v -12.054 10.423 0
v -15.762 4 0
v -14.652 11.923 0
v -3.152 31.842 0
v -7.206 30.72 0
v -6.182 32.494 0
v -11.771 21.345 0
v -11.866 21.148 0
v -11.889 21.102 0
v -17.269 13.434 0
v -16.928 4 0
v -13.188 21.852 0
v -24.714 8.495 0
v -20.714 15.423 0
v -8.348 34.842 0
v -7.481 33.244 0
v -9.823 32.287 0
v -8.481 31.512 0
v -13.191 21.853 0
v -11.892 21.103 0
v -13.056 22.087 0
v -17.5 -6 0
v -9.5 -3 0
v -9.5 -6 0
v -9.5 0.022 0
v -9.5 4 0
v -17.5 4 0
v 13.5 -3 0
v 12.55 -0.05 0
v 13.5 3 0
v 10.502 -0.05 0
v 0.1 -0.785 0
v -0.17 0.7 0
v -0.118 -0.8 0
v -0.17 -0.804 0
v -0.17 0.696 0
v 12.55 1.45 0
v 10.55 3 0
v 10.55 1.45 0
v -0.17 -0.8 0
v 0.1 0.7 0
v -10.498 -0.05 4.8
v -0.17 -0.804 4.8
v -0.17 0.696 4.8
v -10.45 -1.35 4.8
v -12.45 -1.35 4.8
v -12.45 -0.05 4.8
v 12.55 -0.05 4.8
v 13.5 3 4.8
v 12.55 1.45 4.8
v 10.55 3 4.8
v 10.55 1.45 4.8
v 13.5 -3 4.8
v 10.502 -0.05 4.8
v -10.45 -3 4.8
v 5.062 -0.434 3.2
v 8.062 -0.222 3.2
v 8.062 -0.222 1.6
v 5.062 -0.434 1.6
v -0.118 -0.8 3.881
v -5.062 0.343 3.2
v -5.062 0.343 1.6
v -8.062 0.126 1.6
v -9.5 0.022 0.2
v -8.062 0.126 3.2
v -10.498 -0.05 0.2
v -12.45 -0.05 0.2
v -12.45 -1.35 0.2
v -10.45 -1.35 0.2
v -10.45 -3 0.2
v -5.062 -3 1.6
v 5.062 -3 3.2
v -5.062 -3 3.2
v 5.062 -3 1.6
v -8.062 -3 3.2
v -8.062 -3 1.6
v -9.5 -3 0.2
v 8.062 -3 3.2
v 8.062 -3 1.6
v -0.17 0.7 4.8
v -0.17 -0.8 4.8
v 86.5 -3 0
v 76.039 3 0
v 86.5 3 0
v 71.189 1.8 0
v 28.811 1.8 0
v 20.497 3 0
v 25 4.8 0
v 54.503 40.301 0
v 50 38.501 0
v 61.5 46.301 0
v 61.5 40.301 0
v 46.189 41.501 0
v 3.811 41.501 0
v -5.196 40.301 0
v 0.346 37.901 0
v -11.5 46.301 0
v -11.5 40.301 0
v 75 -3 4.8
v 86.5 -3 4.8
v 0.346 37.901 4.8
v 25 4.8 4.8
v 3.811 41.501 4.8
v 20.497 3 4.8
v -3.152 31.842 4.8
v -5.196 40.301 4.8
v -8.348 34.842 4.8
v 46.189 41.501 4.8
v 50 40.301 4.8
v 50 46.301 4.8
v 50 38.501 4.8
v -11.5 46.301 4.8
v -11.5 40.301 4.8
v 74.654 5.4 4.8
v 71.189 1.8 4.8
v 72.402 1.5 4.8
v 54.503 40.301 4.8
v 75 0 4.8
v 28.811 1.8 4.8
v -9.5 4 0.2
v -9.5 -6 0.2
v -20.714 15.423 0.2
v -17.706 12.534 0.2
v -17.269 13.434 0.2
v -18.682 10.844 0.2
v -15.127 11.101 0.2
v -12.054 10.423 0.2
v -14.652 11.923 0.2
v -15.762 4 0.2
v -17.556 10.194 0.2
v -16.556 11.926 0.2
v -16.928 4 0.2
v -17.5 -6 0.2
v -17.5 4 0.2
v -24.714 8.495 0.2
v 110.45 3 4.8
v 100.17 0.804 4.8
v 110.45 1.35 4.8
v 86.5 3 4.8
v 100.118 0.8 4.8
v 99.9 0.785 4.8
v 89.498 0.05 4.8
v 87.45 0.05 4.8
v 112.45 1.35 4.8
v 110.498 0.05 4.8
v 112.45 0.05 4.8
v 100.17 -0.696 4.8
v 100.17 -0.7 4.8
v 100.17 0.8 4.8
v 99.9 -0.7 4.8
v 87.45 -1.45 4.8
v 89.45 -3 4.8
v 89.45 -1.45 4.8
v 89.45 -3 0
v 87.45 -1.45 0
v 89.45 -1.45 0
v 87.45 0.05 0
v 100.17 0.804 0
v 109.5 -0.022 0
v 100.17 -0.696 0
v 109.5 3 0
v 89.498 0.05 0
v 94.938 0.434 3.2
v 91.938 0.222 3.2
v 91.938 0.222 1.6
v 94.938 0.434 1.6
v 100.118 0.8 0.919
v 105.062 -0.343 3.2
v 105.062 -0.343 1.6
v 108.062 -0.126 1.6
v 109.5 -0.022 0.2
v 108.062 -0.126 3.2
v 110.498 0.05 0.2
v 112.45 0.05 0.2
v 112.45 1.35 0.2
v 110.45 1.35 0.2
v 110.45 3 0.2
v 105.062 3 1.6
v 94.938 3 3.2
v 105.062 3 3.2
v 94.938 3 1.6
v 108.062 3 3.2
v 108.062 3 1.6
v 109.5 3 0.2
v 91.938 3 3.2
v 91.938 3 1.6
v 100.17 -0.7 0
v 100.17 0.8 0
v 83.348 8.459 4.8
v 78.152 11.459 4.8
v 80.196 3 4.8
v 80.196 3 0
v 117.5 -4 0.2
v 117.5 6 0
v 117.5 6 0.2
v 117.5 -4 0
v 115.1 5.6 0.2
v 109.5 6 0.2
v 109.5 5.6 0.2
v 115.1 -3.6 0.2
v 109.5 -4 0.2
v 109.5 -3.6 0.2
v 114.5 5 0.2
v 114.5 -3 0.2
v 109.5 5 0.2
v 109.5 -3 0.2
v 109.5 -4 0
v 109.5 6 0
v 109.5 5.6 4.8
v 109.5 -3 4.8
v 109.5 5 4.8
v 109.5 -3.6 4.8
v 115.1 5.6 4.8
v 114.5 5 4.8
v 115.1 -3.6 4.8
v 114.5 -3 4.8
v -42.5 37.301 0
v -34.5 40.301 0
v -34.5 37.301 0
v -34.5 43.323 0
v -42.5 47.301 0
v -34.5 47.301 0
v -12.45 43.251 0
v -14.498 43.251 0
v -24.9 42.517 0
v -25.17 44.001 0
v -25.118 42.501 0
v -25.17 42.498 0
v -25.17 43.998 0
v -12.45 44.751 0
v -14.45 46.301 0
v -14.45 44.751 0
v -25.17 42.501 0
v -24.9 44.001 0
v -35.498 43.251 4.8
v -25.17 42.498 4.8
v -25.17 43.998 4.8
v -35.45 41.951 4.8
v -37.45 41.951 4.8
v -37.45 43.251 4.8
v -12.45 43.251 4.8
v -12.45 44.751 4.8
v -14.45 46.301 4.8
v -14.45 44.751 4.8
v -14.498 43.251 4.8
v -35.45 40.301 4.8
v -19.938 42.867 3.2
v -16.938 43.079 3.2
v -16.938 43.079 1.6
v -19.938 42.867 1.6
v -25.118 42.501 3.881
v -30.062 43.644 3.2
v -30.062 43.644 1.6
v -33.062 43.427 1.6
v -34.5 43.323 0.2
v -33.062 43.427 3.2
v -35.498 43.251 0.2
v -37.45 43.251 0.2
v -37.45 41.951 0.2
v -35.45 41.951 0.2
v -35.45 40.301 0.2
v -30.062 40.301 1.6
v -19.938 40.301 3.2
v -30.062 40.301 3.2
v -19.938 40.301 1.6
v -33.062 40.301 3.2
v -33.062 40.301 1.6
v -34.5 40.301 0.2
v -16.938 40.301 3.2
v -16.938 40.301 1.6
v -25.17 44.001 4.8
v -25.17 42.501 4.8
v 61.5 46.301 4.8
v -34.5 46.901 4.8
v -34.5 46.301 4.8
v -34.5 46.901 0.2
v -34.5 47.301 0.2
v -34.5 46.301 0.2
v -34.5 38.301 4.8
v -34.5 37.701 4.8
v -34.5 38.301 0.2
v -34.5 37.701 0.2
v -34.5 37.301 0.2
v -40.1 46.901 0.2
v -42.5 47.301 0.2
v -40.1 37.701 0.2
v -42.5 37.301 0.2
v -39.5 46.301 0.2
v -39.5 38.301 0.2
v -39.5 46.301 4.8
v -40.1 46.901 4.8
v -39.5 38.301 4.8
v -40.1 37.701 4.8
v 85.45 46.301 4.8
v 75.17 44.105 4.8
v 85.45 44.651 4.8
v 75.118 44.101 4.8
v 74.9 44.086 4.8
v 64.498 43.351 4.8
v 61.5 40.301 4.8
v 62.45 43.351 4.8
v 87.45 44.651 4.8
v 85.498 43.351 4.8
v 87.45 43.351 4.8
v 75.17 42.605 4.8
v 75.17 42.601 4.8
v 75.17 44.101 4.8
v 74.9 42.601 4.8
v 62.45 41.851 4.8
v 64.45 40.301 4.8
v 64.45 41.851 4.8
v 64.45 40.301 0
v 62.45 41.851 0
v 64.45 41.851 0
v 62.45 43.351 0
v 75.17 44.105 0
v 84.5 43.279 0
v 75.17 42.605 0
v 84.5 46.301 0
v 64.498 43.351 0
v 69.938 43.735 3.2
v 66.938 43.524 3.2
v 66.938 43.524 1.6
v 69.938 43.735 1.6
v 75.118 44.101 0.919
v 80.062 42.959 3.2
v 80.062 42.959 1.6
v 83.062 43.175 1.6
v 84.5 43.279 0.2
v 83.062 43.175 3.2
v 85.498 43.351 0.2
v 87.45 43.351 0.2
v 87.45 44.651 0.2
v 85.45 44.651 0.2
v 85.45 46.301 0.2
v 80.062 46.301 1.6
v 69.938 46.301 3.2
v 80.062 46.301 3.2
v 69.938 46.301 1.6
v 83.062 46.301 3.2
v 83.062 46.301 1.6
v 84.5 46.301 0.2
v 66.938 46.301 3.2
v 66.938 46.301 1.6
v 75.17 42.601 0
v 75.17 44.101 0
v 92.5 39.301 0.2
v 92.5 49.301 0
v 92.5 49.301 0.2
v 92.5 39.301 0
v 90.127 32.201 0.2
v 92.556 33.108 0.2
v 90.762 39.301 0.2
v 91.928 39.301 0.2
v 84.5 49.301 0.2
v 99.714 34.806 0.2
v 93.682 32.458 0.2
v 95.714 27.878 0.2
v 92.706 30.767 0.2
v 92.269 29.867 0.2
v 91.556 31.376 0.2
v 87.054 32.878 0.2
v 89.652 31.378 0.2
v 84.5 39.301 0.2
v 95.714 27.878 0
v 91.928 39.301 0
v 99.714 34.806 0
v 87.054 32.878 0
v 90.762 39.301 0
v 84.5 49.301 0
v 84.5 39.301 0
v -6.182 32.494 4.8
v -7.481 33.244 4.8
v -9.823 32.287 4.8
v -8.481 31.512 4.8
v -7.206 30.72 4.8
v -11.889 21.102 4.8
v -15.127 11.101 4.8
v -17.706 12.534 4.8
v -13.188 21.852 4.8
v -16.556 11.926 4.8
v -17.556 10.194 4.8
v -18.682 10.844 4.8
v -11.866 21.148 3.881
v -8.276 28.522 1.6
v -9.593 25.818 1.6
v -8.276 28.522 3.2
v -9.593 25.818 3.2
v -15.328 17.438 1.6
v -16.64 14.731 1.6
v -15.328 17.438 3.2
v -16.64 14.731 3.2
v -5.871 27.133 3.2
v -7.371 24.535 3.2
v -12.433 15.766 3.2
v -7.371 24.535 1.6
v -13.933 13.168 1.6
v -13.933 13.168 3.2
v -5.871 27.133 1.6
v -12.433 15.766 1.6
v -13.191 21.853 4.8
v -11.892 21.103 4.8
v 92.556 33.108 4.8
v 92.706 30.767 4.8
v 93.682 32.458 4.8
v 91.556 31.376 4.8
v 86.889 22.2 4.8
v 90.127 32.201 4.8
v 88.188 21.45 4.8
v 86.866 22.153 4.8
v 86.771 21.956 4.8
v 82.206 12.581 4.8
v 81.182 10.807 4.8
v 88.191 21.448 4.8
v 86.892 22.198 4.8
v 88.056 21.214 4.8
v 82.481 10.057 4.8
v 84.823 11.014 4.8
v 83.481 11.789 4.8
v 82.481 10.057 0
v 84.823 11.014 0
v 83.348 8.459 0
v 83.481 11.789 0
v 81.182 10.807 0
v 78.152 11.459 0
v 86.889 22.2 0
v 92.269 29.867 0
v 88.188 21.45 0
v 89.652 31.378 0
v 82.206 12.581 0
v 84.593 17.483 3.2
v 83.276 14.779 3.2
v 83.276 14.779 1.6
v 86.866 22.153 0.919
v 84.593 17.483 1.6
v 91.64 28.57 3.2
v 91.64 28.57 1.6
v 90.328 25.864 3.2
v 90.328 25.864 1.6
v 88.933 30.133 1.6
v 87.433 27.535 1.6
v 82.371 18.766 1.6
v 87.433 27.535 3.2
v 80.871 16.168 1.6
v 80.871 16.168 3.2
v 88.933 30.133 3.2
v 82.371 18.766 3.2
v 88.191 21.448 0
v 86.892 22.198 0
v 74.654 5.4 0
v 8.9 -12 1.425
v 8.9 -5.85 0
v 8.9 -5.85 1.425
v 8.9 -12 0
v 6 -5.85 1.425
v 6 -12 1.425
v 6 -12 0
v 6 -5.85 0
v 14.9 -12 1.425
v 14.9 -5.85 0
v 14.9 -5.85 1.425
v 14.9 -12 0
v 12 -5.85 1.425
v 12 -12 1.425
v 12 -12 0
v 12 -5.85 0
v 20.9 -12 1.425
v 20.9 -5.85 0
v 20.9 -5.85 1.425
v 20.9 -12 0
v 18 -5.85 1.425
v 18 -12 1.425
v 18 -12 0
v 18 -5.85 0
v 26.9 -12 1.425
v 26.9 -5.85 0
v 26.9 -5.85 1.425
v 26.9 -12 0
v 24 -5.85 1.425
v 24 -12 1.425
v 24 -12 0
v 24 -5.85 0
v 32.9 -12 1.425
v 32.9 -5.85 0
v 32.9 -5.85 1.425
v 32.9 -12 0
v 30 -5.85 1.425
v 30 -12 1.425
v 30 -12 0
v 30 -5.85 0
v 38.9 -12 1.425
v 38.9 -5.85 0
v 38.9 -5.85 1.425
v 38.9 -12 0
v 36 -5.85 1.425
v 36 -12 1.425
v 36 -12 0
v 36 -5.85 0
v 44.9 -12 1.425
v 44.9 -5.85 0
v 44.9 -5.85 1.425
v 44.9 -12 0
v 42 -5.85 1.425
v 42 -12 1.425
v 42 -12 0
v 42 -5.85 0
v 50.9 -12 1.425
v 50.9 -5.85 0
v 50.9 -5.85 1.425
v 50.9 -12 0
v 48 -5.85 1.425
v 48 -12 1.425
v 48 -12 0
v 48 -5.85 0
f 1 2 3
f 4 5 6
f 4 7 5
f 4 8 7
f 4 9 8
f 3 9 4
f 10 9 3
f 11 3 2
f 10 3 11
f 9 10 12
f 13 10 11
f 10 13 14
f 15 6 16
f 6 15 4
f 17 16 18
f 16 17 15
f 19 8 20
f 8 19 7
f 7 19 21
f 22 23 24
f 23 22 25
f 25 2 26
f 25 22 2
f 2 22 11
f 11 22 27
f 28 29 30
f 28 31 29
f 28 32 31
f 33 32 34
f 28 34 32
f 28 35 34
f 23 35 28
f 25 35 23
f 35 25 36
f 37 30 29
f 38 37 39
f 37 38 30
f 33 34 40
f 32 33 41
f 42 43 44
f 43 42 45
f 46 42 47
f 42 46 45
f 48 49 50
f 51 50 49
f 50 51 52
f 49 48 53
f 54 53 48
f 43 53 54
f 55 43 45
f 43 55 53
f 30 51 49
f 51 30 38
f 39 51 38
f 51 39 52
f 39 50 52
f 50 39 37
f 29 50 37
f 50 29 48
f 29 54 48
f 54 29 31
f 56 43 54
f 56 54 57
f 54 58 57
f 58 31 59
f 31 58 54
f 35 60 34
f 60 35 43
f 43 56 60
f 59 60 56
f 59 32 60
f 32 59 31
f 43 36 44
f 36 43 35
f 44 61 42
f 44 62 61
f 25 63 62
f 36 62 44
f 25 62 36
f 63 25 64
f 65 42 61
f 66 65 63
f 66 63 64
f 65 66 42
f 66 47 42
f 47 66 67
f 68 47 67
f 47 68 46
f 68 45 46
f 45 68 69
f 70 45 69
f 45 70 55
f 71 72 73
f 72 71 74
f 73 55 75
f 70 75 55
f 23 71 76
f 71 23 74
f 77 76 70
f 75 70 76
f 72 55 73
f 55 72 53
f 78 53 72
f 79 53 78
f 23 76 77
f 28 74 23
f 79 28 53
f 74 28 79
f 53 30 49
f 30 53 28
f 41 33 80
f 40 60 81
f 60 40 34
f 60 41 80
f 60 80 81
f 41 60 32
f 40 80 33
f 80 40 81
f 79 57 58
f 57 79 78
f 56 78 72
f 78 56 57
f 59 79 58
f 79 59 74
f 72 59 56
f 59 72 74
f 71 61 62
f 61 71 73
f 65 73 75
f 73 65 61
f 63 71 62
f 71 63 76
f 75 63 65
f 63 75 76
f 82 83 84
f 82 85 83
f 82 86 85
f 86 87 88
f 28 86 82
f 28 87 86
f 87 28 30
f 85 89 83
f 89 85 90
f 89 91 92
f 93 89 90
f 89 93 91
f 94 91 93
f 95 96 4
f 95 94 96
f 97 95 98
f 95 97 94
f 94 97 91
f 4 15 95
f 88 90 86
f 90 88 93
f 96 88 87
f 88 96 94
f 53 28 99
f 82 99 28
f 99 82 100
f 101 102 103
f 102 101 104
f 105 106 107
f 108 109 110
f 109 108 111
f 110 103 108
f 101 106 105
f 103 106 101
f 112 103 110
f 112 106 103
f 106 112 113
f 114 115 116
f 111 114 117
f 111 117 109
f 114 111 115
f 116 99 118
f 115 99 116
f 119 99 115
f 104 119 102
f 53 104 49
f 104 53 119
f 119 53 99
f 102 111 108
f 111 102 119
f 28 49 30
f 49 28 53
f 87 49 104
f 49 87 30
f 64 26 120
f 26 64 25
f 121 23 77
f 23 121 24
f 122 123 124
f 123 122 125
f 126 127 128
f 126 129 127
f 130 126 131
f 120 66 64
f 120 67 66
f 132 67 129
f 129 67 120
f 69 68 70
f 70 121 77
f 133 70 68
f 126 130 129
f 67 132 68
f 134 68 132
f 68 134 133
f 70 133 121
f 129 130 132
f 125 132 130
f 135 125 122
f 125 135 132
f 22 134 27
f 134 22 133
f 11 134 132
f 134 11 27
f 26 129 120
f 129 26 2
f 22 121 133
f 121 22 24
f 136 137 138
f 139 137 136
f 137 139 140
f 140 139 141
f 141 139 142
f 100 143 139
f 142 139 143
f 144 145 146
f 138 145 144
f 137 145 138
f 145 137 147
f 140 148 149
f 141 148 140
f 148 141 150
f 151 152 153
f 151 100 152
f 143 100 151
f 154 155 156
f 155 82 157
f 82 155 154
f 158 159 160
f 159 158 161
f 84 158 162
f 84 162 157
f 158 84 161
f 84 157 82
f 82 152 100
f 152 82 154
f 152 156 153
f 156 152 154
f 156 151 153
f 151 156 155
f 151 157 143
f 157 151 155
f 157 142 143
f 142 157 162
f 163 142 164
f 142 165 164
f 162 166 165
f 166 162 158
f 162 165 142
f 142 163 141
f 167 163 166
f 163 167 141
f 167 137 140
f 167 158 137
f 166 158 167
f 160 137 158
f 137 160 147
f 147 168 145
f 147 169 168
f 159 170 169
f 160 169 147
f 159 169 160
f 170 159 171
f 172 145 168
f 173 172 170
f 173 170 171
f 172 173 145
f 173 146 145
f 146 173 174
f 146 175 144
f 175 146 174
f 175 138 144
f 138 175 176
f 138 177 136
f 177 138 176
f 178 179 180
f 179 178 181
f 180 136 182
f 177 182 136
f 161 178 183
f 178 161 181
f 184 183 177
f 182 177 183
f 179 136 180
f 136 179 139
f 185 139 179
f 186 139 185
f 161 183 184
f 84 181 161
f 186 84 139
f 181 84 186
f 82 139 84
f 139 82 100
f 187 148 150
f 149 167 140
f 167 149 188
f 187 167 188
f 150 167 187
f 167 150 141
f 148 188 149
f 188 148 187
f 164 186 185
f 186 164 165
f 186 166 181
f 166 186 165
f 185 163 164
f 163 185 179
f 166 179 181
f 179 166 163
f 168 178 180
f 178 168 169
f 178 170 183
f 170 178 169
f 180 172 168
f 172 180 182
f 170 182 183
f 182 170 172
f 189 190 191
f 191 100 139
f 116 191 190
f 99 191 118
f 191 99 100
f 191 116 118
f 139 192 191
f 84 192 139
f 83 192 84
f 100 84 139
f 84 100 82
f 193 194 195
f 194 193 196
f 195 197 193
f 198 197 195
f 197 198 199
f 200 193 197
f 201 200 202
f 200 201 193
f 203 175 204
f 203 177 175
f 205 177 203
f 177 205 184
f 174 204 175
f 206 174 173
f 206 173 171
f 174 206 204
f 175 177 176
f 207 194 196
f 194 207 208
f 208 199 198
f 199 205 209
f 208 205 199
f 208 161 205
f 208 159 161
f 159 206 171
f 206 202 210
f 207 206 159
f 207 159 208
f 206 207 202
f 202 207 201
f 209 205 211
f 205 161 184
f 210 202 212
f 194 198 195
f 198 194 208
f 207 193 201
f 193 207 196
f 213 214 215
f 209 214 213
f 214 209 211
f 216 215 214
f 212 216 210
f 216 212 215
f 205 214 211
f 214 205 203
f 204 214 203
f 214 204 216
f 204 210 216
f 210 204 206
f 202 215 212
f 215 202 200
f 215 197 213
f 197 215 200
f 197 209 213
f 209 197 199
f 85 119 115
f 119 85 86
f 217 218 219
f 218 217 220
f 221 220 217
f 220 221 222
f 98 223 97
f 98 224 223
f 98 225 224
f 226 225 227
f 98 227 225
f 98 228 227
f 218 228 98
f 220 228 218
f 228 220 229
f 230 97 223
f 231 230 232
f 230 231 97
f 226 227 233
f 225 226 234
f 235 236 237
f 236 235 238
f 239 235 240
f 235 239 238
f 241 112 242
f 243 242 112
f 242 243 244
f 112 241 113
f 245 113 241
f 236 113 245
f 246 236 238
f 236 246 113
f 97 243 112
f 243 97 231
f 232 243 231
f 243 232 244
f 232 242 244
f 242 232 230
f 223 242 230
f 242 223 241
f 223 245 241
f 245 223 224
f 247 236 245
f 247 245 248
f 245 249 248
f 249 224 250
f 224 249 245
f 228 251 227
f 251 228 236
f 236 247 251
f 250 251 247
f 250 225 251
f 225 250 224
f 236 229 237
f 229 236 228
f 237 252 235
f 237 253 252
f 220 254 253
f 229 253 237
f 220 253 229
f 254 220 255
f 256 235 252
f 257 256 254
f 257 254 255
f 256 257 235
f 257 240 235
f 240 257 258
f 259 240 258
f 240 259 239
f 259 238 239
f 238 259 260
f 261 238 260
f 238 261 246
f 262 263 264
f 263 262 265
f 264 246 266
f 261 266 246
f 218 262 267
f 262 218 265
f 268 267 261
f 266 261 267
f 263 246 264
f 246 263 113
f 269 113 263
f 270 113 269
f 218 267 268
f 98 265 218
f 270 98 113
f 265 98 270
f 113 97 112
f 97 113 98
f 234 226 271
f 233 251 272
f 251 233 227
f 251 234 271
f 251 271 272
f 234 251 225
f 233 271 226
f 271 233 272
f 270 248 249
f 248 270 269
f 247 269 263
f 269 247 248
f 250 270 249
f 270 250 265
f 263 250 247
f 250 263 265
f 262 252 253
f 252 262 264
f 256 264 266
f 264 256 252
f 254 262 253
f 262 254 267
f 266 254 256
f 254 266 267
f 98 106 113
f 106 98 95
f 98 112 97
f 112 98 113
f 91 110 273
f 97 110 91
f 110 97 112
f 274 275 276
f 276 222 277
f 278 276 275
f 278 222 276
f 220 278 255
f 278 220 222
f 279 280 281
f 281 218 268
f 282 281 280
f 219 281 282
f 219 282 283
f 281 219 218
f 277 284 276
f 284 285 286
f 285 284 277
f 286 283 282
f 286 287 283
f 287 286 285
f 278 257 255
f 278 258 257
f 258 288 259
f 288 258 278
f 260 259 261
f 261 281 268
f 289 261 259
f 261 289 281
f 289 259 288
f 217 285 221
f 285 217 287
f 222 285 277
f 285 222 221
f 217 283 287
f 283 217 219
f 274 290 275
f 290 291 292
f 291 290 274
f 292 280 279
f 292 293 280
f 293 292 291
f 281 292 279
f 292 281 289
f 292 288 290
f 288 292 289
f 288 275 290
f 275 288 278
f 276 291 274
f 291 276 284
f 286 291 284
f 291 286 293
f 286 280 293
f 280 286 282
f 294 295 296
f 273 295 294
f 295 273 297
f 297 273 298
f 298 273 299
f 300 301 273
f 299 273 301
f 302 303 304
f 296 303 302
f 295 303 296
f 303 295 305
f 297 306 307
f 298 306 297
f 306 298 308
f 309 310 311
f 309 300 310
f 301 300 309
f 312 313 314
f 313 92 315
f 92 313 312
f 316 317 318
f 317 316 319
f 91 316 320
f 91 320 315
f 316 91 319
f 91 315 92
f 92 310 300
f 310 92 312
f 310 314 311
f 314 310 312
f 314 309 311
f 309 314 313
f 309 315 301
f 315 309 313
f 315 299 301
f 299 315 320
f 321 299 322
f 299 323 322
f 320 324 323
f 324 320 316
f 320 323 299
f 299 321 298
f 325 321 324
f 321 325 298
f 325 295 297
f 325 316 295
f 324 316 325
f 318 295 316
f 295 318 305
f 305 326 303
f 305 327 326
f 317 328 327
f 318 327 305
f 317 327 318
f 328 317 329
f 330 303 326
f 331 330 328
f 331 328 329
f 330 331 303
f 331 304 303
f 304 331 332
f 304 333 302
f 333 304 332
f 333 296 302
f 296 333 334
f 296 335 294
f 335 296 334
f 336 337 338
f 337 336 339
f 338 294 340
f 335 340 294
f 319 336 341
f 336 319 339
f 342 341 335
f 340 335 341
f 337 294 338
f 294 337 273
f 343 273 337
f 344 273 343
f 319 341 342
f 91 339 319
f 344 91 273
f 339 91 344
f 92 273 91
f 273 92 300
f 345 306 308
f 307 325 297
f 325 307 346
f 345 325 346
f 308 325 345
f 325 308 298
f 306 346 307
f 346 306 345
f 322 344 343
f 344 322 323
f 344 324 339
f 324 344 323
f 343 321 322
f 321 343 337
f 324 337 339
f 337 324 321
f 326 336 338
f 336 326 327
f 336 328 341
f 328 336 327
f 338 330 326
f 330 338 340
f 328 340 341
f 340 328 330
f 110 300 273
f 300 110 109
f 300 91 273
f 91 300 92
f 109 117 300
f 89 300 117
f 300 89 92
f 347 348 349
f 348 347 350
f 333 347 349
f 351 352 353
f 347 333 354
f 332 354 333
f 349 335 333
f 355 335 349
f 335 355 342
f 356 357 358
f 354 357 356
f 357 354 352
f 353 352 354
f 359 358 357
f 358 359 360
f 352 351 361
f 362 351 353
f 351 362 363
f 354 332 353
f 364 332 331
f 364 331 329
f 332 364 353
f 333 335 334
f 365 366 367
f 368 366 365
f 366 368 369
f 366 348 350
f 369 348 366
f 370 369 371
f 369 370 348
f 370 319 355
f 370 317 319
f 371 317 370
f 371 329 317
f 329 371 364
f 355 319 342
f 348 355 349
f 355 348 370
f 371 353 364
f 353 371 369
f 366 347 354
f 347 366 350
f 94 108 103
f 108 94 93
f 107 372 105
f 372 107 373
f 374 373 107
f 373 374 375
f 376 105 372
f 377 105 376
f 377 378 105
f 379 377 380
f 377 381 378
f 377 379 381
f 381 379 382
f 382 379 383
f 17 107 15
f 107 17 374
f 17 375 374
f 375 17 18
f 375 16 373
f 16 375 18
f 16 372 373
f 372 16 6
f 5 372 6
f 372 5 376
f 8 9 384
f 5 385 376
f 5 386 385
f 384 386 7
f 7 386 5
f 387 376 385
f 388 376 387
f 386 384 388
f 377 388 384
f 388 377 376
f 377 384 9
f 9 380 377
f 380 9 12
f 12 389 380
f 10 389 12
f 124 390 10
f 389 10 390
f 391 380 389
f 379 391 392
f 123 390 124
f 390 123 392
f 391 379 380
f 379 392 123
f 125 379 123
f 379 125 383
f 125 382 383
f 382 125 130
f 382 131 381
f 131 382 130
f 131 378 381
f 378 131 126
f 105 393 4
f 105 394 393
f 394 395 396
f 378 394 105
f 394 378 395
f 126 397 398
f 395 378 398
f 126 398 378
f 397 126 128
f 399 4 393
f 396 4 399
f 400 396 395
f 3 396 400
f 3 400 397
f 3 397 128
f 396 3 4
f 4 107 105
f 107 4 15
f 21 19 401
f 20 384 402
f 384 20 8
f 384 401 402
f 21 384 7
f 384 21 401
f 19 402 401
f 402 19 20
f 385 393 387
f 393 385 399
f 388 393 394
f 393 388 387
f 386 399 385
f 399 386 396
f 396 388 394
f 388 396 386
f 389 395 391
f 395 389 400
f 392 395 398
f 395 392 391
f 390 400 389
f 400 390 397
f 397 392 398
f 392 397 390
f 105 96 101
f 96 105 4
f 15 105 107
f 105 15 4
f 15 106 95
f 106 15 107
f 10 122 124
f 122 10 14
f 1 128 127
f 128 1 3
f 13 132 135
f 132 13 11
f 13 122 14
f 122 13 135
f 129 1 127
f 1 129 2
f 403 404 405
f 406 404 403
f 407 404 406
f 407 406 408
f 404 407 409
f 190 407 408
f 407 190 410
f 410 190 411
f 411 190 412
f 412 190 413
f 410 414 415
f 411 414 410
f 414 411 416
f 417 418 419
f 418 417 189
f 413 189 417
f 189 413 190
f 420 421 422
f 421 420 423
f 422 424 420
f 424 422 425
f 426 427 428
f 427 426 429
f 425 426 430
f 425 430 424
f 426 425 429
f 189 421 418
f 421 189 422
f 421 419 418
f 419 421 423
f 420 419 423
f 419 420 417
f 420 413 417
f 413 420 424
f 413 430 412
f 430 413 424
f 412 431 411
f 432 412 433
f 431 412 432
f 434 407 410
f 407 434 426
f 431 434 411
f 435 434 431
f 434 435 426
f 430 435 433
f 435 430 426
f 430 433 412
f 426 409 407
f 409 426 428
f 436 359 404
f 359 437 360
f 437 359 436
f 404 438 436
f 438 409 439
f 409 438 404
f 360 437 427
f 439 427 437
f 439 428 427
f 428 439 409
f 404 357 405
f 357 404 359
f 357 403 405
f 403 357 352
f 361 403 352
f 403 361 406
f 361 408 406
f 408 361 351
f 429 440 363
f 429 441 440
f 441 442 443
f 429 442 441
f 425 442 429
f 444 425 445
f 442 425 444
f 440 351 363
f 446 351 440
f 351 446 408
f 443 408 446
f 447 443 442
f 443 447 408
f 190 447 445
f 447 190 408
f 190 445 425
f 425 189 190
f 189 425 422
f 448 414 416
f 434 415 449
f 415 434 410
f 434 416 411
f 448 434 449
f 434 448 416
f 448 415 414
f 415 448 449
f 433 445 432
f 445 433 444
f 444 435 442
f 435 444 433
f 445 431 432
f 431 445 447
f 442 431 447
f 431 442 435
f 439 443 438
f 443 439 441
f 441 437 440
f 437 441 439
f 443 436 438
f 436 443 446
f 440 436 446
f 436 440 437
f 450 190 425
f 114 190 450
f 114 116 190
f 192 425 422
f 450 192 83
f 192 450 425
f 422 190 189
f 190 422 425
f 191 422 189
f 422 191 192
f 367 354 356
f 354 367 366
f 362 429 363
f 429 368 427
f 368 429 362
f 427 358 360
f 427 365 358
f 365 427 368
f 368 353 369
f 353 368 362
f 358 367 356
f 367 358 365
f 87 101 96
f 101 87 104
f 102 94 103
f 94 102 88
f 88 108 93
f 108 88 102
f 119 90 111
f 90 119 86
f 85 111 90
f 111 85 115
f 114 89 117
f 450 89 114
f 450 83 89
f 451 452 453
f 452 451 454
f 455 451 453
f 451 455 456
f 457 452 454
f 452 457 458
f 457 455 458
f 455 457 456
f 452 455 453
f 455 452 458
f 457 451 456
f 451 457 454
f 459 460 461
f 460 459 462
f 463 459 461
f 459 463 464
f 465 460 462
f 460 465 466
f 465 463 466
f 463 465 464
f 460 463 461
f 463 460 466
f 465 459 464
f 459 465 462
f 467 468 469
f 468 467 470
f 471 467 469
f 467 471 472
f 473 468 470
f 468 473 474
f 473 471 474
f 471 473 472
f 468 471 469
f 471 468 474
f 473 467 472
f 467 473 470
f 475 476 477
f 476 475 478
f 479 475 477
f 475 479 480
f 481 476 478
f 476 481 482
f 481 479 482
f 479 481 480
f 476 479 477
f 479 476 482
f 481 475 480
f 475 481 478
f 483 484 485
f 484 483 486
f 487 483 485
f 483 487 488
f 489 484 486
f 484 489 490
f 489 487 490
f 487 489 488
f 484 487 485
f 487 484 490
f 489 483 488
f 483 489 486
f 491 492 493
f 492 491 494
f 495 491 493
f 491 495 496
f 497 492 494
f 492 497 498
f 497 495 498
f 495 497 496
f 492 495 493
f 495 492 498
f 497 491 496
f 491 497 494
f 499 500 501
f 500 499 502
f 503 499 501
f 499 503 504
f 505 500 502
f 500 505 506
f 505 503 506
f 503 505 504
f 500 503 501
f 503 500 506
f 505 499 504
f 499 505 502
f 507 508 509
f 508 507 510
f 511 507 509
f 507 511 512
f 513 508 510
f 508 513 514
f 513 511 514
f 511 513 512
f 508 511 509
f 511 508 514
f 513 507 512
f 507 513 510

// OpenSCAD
// file: tsugite.scad
// "tsugite" (joint) -- Okkake Daisen Tsugi
// adapted from the traditional Japanese wood construction technology
//
// Copyright (c) 2022 Kazunori Ueda, All Rights Reserved.
// Released under the MIT license:
// Permission is hereby granted, free of charge, to any person obtaining a 
// copy of this software and associated documentation files (the 
// "Software"), to deal in the Software without restriction, including 
// without limitation the rights to use, copy, modify, merge, publish, 
// distribute, sublicense, and/or sell copies of the Software, and to 
// permit persons to whom the Software is furnished to do so, subject to 
// the following conditions:
//
// The above copyright notice and this permission notice shall be 
// included in all copies or substantial portions of the Software.
//
// HE SOFTWARE IS PROVIDED "AS IS", WITHOUT WARRANTY OF ANY KIND, 
// EXPRESS OR IMPLIED, INCLUDING BUT NOT LIMITED TO THE WARRANTIES OF 
// MERCHANTABILITY, FITNESS FOR A PARTICULAR PURPOSE AND 
// NONINFRINGEMENT. IN NO EVENT SHALL THE AUTHORS OR COPYRIGHT HOLDERS BE 
// LIABLE FOR ANY CLAIM, DAMAGES OR OTHER LIABILITY, WHETHER IN AN ACTION 
// OF CONTRACT, TORT OR OTHERWISE, ARISING FROM, OUT OF OR IN CONNECTION 
// WITH THE SOFTWARE OR THE USE OR OTHER DEALINGS IN THE SOFTWARE.

tw = 4.8; // joint (tsugite) width (y-axis)
tw2 = 4.8; // width of the beam to be connected
td = 4.8; // joint depth (z-axis)
tl = tw*1.75; // slope length (traditional standard: 1.75)
tl2 = 1.5; // end hook length
hh = tw/4-0.1; // end hook height
tx = tl+tl2+1; // minimal joint length / 2 (x-axis)
pw = 3; // plug width
pd = 1.6; // plug depth
ch = max(1.4, tw/4); //center hook height
d = -0.05; // basic slack for contacting faces (larger (towards 0) means tighter); 
         // needs careful adjustment so that the two pieces are joined firmly
         // (possibly with a plyer or a wooden hammer) but not too tightly
         // (in which case the joint might look non-straight)
d1 = -0.02; // center slack (possibly tigher than d)
d2 = -td/20; // center slope (traditional standard: -td/20)
len = 50;  // total joint length

module tsugite_noplug(h) {
  linear_extrude(height=h) 
    offset(delta=d)
    polygon([
      [d2/2,0], [d2/2,-ch/2],           // from center
      [tl,0], [tl+tl2,0], [tl+tl2,hh], // to the right
      [tl,hh], [tl,tw/2-d],            // right hook
      [tx-d,tw/2-d], [tx-d,-tw/2+d],   // top and right edge
      [-tl,-tw/2+d], [-tl,-hh],        // bottom edge
      [-(tl+tl2),-hh], [-(tl+tl2),0],  // left hook
      [-tl,0],[d2/2,ch/2]               // back to the center
    ]);
  // center slope
  translate([-d2/2,ch/2+d,0]) rotate([90,0,0])
  linear_extrude(height=ch)
    polygon([[d1,0],[d2+d,td],[d2+d,0]]);
}

module tsugite_plug(h) {
  difference() {
    tsugite_noplug(h);
    translate([tl/1.6,0,h/2])
    cube([pw,tw,pd],center=true);
    translate([-tl/1.6,0,h/2])
    cube([pw,tw,pd],center=true);
    }
}

module tsugite(len,lr) {  // lr = 1 (right half) or -1 (left half)
  translate([0,0,(1-lr)*td/2])
  rotate([(1-lr)*90,0]) scale([lr,1]) {
    tsugite_plug(td);
    linear_extrude(td)
      polygon([[tx,-tw/2],[len/2,-tw2/2],
               [len/2,tw2/2],[tx,tw/2]]);
  }
}

module plug(a,b,d) {
  cube([pw+a*d,tw+0.15,pd+b*d]);
}

// two halves with non-identical center slope directions
//tsugite(len,1);
//translate([0,10]) // commenting out this line would show the tightness of the joint
//  tsugite(len,-1);

// plugs of different sizes; choose tight ones.
// loose ones would make the joint significantly weaker;
// while too tight ones (in z-axis) would cause delamination
// parameters: p[serial number, x-axis tolerance, z-axis tolerance]
//for (p=[[0,3,4],[1,2,3],[2,1,3]])
//  for(x=[-1,1]) translate([x*tl/1.6-pw/2,-(p[0]+1.5)*(tw+1)])
//    plug(p[1],p[2],-0.05);

// ends for tensile test
$fn=36;
module end() {
  translate([0,0,td/2]) difference() {
    translate([-7,0,0]) cube([36,20,td],center=true);
    cylinder(d=6,h=td,center=true);
    for (i=[-1,1])
    translate([-25,i*(tw/2+12.5)]) cylinder(d=25,h=td,center=true);
  }
}

//translate([50,0]) end();
//translate([-50,10]) scale([-1,1]) end();
// main file
// parameterized truss unit
//
// Copyright (c) 2022 Kazunori Ueda, All Rights Reserved.
// Released under the MIT license:
// Permission is hereby granted, free of charge, to any person obtaining a 
// copy of this software and associated documentation files (the 
// "Software"), to deal in the Software without restriction, including 
// without limitation the rights to use, copy, modify, merge, publish, 
// distribute, sublicense, and/or sell copies of the Software, and to 
// permit persons to whom the Software is furnished to do so, subject to 
// the following conditions:
//
// The above copyright notice and this permission notice shall be 
// included in all copies or substantial portions of the Software.
//
// HE SOFTWARE IS PROVIDED "AS IS", WITHOUT WARRANTY OF ANY KIND, 
// EXPRESS OR IMPLIED, INCLUDING BUT NOT LIMITED TO THE WARRANTIES OF 
// MERCHANTABILITY, FITNESS FOR A PARTICULAR PURPOSE AND 
// NONINFRINGEMENT. IN NO EVENT SHALL THE AUTHORS OR COPYRIGHT HOLDERS BE 
// LIABLE FOR ANY CLAIM, DAMAGES OR OTHER LIABILITY, WHETHER IN AN ACTION 
// OF CONTRACT, TORT OR OTHERWISE, ARISING FROM, OUT OF OR IN CONNECTION 
// WITH THE SOFTWARE OR THE USE OR OTHER DEALINGS IN THE SOFTWARE.

include <tsugite.scad>;
// parameters for tsugite joints
bw = 4.8; // beam width
tw = 6.0; // joint width (y-axis)
tw2 = tw; // width of joint extension
td = 4.8; // joint (tsugite) depth (z-axis)
tl = tw*1.75; // slope length (traditional standard: 1.75)
tl2 = 2; // end hook length
hh = tw/4-0.1; // end hook height
tx = tl+tl2+1; // minimal joint length / 2 (x-axis)
pw = 3; // plug width
pd = 1.6; // plug depth
ch = max(1.4, tw/4); //center hook height
d = -0.05; // basic slack
d1 = -0.02; // center slack (possibly tigher than d)
d2 = -td/20; // center slope

// truss parameters
len = 50; // unit length of truss triangle

// pad and wall control for first-layer adhesion
pad = 2; // 0: no pad at joint ends; 1: standard pad; 2: pad with wall

// wall for ensuring the right shape of the far ends of joints
module wall() {
  linear_extrude(td) translate([0,-tw/2-2])
  polygon([[-1.6,-0.6],[4,-0.6],[4,0],[-1,0],
           [-1,2+tw],[4,2+tw],[4,2.6+tw],[-1.6,2.6+tw]]);
}

// joint with pad and optional wall  
module tsugite_pad(len,lr,wall) {
  tsugite(len,lr);
  if (pad >= 1) 
    translate([-lr*tx-4,-(2+lr+tw/2),0]) cube([8,tw+4,0.2]);
  if (pad >= 2 && wall == 1)
    rotate([0,0,90*(1-lr)]) translate([-tx,0]) wall();
}

module horizon(upside) {
  tsugite_pad(len,1,upside);
  translate([2*len,0])
  tsugite_pad(len,-1,1-upside);
  l = 2*len - 2*tx;
  translate([tx,-0.5*tw+upside*(tw-bw),0])
    cube([l,bw,td]);
  translate([tx,-0.5*tw,0]) cube([len/2-tx,tw,td]);
  translate([1.5*len,-0.5*tw,0]) cube([len/2-tx,tw,td]);
}

module slanted(x,y,angle,lr) {
  translate([x,y])
  rotate([0,0,angle]) translate([-len/2,0]) {
    tsugite_pad(len,lr,0);
  }
}

module slanted_full(x,y,angle) {
  translate([x,y])
    rotate([0,0,angle]) translate([0,-bw/2]) 
      cube([len,bw,td]);
}

// optional plates for additional components
plate_height = bw + sqrt(3)/2*6;
module plate1() {
  translate([-3,0,0]) cube([6,plate_height,td]);
}
module plate2() {
  translate([-3,plate_height-3,td/3]) cube([6,3,td/3]);
}

module truss(plate) {
  horizon(0); // lower horizontal beam
  translate([-len/2,sin(60)*len]) horizon(1); // upper horizontal beam
  slanted(0,sin(60)*len,60,1);  // left slanted joint
  slanted(2*len,sin(60)*len,60,-1);  // right slanted joint
  difference() {
    union() {
      slanted_full(0.5*len,0,120); // left slanted beam
      slanted_full(0.5*len,0,60);  // middle slanted beam
      if (plate==1) translate([0.5*len,0,0]) plate1();
    }
    if (plate==1) translate([0.5*len,0,0]) plate2();
  }
  slanted_full(1.5*len,0,120);     // right slanted beam
}

intersection() {
  truss(0);
//  cube([2*len,2*len,100], center=true); // for the right end
//  translate([2*len,0]) cube([2*len,2*len,100], center=true); // for the left end
}

// plugs (with two extras); carefully tune the first two args of plug!
for(x=[1:8]) translate([6*x,-2*tw]) plug(2,3.5,-0.05);
 
